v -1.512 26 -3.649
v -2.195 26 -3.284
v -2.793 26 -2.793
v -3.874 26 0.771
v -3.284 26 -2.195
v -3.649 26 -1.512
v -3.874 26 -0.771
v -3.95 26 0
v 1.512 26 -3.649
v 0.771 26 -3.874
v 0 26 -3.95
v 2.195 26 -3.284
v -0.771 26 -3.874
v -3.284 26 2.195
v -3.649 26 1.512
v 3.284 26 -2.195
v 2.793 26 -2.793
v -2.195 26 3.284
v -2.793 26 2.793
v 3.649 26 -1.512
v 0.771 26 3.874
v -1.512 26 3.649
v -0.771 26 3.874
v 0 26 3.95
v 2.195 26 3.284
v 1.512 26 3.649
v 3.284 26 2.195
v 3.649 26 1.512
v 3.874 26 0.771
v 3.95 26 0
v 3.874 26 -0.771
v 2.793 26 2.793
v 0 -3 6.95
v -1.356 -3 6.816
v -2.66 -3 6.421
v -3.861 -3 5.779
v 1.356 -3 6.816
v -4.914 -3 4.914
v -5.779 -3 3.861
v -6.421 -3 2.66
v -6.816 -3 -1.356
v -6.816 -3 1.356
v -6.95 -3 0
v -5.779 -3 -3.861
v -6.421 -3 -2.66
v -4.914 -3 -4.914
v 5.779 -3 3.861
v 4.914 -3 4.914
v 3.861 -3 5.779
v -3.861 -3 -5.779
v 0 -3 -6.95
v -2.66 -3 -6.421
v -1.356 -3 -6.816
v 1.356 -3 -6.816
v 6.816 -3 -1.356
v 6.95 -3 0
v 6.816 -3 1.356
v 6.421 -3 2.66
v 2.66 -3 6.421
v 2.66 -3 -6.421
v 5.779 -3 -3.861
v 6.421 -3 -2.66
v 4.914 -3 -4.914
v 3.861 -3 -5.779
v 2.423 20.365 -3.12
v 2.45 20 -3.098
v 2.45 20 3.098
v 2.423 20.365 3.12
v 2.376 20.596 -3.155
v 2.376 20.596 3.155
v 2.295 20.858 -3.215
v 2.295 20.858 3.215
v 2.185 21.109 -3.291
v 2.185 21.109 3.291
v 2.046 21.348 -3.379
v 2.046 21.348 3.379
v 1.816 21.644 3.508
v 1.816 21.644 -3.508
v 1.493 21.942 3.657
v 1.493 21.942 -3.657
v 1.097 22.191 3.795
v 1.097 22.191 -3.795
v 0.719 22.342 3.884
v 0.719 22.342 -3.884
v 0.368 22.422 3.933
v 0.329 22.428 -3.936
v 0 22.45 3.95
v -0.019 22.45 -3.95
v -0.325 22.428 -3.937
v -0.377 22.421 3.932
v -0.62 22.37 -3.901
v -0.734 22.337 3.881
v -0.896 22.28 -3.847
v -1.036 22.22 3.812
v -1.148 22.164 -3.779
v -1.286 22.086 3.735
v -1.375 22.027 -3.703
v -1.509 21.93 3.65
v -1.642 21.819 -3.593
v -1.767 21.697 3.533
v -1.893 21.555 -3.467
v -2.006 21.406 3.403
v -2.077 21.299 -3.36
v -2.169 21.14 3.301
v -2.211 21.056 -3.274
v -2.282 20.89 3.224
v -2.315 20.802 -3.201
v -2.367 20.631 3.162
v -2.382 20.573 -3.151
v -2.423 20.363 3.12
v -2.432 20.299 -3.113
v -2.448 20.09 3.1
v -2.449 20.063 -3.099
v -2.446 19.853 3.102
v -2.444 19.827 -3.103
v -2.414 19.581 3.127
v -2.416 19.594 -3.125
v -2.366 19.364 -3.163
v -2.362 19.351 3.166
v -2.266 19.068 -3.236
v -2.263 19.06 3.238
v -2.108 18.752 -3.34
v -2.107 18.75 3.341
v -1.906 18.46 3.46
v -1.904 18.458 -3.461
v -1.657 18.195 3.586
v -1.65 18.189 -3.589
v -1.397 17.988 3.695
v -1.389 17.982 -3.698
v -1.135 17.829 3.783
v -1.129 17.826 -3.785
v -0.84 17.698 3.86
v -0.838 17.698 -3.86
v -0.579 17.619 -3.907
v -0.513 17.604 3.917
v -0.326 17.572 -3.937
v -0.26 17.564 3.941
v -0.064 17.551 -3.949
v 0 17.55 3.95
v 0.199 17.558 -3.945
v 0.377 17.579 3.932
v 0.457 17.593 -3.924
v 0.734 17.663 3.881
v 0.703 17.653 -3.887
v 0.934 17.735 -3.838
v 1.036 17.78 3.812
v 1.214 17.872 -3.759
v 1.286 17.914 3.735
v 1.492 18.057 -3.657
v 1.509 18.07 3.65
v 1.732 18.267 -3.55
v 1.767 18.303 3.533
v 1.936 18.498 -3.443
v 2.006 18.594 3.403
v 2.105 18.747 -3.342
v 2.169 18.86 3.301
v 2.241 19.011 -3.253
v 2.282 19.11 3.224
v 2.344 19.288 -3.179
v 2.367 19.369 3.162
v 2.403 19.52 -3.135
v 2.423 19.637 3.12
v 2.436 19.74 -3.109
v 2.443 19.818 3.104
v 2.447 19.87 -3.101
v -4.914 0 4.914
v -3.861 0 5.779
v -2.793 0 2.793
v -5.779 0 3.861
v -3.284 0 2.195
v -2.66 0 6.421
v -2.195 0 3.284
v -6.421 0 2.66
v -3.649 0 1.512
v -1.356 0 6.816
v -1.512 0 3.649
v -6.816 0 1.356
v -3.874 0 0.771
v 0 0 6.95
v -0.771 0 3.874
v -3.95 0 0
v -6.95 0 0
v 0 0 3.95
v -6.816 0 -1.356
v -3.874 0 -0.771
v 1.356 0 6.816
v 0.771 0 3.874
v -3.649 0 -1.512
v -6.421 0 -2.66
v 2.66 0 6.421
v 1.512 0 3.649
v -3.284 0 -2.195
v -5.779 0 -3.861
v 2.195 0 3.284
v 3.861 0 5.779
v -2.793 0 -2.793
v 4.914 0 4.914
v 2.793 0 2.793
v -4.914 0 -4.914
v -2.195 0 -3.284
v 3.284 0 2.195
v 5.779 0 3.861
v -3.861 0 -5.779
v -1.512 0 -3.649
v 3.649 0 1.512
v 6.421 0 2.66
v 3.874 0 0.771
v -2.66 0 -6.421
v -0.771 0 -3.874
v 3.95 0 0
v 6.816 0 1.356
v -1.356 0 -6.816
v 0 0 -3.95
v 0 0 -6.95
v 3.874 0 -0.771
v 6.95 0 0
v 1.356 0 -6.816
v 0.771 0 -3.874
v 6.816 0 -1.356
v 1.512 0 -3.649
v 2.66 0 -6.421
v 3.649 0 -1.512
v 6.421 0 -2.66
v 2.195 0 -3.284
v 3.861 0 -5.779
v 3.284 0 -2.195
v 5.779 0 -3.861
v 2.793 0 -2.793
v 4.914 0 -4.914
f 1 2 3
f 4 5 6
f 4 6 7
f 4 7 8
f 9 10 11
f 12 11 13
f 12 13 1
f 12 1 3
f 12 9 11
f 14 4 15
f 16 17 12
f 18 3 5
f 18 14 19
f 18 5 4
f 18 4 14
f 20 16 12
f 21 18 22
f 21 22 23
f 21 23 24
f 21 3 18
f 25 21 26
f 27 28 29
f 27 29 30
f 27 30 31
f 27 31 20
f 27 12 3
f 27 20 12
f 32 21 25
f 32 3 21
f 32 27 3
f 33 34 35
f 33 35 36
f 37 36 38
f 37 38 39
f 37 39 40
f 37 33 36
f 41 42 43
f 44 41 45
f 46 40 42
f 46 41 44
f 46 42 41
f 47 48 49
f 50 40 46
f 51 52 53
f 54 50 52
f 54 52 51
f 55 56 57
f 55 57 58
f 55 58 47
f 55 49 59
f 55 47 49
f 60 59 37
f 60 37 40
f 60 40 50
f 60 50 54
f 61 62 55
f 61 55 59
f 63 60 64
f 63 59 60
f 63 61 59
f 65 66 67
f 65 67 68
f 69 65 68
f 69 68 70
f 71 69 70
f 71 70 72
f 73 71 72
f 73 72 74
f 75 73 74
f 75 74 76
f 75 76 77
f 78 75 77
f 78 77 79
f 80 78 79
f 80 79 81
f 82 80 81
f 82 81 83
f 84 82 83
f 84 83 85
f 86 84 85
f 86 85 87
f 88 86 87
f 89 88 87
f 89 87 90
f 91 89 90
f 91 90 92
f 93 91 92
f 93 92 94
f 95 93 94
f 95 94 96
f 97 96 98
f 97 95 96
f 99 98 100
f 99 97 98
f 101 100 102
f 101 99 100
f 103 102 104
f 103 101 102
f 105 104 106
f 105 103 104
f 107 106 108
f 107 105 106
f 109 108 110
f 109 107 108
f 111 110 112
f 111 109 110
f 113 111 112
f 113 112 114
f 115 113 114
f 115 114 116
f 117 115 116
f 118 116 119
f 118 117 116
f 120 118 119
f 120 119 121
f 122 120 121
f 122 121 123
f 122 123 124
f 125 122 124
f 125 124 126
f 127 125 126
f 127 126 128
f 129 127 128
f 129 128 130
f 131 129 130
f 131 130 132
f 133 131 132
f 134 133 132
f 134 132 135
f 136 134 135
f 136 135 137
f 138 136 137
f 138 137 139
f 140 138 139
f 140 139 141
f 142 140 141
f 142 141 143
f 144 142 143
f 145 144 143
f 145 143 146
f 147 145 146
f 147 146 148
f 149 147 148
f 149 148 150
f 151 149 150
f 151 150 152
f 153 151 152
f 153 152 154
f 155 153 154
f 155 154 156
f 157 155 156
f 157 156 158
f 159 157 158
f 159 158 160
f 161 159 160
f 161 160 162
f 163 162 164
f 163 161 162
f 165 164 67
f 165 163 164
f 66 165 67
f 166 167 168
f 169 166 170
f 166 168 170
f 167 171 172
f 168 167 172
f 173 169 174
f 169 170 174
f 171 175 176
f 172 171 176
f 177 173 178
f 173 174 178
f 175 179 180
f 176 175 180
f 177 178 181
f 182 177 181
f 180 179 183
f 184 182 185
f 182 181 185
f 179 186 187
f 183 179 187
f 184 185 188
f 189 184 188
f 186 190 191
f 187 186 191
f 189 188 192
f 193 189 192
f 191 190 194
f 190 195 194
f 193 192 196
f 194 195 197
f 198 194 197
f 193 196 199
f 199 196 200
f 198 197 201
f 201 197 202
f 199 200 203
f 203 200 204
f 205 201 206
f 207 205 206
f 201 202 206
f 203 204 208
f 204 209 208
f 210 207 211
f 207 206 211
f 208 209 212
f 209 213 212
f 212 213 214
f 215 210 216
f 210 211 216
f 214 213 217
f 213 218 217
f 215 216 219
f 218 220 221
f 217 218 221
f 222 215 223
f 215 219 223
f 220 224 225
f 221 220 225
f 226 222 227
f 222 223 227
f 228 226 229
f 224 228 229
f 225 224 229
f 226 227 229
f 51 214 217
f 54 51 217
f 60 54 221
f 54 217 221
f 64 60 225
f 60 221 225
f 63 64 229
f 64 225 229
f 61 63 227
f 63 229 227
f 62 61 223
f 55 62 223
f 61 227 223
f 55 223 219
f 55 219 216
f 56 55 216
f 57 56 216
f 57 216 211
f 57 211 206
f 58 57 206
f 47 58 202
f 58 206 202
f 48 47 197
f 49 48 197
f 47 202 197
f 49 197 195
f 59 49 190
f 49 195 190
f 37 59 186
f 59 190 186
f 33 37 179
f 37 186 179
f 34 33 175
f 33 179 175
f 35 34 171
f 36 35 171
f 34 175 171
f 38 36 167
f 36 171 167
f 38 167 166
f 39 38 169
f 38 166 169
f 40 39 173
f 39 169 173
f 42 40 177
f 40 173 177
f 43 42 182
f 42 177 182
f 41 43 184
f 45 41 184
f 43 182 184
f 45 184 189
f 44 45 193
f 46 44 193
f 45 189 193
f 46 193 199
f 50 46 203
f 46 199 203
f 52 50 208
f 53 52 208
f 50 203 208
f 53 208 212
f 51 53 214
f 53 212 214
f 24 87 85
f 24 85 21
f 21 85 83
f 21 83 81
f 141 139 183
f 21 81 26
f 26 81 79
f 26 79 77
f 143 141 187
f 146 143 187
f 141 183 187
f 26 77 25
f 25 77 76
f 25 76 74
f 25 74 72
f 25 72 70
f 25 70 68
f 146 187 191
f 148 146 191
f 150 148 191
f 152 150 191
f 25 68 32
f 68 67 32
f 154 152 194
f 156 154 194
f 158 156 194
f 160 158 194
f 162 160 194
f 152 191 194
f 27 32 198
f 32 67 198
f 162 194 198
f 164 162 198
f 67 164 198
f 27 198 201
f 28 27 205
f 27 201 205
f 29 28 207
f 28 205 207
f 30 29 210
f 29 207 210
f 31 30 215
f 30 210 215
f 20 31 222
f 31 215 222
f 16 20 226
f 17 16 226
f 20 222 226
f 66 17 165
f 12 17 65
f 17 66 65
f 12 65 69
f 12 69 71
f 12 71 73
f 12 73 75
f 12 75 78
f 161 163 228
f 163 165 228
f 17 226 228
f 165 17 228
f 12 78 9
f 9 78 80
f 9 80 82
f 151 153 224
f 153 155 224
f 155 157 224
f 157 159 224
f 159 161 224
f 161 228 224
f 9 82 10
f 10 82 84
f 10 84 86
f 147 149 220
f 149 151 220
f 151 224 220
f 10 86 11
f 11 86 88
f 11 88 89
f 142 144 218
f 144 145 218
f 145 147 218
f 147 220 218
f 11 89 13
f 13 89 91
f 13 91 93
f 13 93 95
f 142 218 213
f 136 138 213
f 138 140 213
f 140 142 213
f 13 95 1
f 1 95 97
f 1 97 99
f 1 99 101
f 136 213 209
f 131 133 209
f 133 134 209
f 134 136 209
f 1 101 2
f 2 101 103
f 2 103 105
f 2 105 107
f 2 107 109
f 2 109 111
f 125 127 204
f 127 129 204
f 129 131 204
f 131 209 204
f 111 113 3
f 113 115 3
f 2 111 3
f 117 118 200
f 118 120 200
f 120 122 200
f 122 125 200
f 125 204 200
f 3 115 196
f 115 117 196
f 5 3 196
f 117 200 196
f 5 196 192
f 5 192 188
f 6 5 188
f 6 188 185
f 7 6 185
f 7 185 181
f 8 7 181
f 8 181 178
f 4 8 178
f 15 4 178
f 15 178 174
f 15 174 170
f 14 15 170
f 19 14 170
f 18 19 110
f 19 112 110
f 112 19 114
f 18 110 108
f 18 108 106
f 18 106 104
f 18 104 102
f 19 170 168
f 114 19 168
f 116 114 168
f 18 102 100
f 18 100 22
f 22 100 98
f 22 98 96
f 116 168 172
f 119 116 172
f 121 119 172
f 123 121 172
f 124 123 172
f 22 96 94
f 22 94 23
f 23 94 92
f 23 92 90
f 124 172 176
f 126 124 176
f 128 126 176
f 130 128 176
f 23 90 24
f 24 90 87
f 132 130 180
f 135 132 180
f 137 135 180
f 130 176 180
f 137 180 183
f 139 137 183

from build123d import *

# Parameters (mm, degrees)
SKETCH1_R               = 3.95
BOSS_EXTRUDE1_DEPTH     = 26
CUT_EXTRUDE1_DEPTH      = 27.59332623
CUT_EXTRUDE1_DEPTH_BACK = 27.59332623
SKETCH2_R               = 2.45
SKETCH3_R               = 6.95
BOSS_EXTRUDE2_DEPTH     = 3


with BuildPart() as part:
    # Sketch1 → Boss-Extrude1 (new body)
    with BuildSketch(Plane(origin=(0, 0, 0), x_dir=(1, 0, 0), z_dir=(0, 1, 0))):
        with Locations(Location((0, 0, 0), (0, 0, 270))):
            Circle(SKETCH1_R)
    extrude(amount=BOSS_EXTRUDE1_DEPTH)

    # Sketch2 → Cut-Extrude1 (cut, two sides: drawn at the far end of the back side and taken through both)
    with BuildSketch(Plane.XY.offset(-CUT_EXTRUDE1_DEPTH_BACK)):
        with Locations((0, 20)):
            Circle(SKETCH2_R)
    extrude(amount=CUT_EXTRUDE1_DEPTH + CUT_EXTRUDE1_DEPTH_BACK, mode=Mode.SUBTRACT)

    # Sketch3 → Boss-Extrude2 (add)
    with BuildSketch(Plane.XZ):
        with Locations(Location((0, 0, 0), (0, 0, 270))):
            Circle(SKETCH3_R)
    extrude(amount=BOSS_EXTRUDE2_DEPTH)


solid = part.part
